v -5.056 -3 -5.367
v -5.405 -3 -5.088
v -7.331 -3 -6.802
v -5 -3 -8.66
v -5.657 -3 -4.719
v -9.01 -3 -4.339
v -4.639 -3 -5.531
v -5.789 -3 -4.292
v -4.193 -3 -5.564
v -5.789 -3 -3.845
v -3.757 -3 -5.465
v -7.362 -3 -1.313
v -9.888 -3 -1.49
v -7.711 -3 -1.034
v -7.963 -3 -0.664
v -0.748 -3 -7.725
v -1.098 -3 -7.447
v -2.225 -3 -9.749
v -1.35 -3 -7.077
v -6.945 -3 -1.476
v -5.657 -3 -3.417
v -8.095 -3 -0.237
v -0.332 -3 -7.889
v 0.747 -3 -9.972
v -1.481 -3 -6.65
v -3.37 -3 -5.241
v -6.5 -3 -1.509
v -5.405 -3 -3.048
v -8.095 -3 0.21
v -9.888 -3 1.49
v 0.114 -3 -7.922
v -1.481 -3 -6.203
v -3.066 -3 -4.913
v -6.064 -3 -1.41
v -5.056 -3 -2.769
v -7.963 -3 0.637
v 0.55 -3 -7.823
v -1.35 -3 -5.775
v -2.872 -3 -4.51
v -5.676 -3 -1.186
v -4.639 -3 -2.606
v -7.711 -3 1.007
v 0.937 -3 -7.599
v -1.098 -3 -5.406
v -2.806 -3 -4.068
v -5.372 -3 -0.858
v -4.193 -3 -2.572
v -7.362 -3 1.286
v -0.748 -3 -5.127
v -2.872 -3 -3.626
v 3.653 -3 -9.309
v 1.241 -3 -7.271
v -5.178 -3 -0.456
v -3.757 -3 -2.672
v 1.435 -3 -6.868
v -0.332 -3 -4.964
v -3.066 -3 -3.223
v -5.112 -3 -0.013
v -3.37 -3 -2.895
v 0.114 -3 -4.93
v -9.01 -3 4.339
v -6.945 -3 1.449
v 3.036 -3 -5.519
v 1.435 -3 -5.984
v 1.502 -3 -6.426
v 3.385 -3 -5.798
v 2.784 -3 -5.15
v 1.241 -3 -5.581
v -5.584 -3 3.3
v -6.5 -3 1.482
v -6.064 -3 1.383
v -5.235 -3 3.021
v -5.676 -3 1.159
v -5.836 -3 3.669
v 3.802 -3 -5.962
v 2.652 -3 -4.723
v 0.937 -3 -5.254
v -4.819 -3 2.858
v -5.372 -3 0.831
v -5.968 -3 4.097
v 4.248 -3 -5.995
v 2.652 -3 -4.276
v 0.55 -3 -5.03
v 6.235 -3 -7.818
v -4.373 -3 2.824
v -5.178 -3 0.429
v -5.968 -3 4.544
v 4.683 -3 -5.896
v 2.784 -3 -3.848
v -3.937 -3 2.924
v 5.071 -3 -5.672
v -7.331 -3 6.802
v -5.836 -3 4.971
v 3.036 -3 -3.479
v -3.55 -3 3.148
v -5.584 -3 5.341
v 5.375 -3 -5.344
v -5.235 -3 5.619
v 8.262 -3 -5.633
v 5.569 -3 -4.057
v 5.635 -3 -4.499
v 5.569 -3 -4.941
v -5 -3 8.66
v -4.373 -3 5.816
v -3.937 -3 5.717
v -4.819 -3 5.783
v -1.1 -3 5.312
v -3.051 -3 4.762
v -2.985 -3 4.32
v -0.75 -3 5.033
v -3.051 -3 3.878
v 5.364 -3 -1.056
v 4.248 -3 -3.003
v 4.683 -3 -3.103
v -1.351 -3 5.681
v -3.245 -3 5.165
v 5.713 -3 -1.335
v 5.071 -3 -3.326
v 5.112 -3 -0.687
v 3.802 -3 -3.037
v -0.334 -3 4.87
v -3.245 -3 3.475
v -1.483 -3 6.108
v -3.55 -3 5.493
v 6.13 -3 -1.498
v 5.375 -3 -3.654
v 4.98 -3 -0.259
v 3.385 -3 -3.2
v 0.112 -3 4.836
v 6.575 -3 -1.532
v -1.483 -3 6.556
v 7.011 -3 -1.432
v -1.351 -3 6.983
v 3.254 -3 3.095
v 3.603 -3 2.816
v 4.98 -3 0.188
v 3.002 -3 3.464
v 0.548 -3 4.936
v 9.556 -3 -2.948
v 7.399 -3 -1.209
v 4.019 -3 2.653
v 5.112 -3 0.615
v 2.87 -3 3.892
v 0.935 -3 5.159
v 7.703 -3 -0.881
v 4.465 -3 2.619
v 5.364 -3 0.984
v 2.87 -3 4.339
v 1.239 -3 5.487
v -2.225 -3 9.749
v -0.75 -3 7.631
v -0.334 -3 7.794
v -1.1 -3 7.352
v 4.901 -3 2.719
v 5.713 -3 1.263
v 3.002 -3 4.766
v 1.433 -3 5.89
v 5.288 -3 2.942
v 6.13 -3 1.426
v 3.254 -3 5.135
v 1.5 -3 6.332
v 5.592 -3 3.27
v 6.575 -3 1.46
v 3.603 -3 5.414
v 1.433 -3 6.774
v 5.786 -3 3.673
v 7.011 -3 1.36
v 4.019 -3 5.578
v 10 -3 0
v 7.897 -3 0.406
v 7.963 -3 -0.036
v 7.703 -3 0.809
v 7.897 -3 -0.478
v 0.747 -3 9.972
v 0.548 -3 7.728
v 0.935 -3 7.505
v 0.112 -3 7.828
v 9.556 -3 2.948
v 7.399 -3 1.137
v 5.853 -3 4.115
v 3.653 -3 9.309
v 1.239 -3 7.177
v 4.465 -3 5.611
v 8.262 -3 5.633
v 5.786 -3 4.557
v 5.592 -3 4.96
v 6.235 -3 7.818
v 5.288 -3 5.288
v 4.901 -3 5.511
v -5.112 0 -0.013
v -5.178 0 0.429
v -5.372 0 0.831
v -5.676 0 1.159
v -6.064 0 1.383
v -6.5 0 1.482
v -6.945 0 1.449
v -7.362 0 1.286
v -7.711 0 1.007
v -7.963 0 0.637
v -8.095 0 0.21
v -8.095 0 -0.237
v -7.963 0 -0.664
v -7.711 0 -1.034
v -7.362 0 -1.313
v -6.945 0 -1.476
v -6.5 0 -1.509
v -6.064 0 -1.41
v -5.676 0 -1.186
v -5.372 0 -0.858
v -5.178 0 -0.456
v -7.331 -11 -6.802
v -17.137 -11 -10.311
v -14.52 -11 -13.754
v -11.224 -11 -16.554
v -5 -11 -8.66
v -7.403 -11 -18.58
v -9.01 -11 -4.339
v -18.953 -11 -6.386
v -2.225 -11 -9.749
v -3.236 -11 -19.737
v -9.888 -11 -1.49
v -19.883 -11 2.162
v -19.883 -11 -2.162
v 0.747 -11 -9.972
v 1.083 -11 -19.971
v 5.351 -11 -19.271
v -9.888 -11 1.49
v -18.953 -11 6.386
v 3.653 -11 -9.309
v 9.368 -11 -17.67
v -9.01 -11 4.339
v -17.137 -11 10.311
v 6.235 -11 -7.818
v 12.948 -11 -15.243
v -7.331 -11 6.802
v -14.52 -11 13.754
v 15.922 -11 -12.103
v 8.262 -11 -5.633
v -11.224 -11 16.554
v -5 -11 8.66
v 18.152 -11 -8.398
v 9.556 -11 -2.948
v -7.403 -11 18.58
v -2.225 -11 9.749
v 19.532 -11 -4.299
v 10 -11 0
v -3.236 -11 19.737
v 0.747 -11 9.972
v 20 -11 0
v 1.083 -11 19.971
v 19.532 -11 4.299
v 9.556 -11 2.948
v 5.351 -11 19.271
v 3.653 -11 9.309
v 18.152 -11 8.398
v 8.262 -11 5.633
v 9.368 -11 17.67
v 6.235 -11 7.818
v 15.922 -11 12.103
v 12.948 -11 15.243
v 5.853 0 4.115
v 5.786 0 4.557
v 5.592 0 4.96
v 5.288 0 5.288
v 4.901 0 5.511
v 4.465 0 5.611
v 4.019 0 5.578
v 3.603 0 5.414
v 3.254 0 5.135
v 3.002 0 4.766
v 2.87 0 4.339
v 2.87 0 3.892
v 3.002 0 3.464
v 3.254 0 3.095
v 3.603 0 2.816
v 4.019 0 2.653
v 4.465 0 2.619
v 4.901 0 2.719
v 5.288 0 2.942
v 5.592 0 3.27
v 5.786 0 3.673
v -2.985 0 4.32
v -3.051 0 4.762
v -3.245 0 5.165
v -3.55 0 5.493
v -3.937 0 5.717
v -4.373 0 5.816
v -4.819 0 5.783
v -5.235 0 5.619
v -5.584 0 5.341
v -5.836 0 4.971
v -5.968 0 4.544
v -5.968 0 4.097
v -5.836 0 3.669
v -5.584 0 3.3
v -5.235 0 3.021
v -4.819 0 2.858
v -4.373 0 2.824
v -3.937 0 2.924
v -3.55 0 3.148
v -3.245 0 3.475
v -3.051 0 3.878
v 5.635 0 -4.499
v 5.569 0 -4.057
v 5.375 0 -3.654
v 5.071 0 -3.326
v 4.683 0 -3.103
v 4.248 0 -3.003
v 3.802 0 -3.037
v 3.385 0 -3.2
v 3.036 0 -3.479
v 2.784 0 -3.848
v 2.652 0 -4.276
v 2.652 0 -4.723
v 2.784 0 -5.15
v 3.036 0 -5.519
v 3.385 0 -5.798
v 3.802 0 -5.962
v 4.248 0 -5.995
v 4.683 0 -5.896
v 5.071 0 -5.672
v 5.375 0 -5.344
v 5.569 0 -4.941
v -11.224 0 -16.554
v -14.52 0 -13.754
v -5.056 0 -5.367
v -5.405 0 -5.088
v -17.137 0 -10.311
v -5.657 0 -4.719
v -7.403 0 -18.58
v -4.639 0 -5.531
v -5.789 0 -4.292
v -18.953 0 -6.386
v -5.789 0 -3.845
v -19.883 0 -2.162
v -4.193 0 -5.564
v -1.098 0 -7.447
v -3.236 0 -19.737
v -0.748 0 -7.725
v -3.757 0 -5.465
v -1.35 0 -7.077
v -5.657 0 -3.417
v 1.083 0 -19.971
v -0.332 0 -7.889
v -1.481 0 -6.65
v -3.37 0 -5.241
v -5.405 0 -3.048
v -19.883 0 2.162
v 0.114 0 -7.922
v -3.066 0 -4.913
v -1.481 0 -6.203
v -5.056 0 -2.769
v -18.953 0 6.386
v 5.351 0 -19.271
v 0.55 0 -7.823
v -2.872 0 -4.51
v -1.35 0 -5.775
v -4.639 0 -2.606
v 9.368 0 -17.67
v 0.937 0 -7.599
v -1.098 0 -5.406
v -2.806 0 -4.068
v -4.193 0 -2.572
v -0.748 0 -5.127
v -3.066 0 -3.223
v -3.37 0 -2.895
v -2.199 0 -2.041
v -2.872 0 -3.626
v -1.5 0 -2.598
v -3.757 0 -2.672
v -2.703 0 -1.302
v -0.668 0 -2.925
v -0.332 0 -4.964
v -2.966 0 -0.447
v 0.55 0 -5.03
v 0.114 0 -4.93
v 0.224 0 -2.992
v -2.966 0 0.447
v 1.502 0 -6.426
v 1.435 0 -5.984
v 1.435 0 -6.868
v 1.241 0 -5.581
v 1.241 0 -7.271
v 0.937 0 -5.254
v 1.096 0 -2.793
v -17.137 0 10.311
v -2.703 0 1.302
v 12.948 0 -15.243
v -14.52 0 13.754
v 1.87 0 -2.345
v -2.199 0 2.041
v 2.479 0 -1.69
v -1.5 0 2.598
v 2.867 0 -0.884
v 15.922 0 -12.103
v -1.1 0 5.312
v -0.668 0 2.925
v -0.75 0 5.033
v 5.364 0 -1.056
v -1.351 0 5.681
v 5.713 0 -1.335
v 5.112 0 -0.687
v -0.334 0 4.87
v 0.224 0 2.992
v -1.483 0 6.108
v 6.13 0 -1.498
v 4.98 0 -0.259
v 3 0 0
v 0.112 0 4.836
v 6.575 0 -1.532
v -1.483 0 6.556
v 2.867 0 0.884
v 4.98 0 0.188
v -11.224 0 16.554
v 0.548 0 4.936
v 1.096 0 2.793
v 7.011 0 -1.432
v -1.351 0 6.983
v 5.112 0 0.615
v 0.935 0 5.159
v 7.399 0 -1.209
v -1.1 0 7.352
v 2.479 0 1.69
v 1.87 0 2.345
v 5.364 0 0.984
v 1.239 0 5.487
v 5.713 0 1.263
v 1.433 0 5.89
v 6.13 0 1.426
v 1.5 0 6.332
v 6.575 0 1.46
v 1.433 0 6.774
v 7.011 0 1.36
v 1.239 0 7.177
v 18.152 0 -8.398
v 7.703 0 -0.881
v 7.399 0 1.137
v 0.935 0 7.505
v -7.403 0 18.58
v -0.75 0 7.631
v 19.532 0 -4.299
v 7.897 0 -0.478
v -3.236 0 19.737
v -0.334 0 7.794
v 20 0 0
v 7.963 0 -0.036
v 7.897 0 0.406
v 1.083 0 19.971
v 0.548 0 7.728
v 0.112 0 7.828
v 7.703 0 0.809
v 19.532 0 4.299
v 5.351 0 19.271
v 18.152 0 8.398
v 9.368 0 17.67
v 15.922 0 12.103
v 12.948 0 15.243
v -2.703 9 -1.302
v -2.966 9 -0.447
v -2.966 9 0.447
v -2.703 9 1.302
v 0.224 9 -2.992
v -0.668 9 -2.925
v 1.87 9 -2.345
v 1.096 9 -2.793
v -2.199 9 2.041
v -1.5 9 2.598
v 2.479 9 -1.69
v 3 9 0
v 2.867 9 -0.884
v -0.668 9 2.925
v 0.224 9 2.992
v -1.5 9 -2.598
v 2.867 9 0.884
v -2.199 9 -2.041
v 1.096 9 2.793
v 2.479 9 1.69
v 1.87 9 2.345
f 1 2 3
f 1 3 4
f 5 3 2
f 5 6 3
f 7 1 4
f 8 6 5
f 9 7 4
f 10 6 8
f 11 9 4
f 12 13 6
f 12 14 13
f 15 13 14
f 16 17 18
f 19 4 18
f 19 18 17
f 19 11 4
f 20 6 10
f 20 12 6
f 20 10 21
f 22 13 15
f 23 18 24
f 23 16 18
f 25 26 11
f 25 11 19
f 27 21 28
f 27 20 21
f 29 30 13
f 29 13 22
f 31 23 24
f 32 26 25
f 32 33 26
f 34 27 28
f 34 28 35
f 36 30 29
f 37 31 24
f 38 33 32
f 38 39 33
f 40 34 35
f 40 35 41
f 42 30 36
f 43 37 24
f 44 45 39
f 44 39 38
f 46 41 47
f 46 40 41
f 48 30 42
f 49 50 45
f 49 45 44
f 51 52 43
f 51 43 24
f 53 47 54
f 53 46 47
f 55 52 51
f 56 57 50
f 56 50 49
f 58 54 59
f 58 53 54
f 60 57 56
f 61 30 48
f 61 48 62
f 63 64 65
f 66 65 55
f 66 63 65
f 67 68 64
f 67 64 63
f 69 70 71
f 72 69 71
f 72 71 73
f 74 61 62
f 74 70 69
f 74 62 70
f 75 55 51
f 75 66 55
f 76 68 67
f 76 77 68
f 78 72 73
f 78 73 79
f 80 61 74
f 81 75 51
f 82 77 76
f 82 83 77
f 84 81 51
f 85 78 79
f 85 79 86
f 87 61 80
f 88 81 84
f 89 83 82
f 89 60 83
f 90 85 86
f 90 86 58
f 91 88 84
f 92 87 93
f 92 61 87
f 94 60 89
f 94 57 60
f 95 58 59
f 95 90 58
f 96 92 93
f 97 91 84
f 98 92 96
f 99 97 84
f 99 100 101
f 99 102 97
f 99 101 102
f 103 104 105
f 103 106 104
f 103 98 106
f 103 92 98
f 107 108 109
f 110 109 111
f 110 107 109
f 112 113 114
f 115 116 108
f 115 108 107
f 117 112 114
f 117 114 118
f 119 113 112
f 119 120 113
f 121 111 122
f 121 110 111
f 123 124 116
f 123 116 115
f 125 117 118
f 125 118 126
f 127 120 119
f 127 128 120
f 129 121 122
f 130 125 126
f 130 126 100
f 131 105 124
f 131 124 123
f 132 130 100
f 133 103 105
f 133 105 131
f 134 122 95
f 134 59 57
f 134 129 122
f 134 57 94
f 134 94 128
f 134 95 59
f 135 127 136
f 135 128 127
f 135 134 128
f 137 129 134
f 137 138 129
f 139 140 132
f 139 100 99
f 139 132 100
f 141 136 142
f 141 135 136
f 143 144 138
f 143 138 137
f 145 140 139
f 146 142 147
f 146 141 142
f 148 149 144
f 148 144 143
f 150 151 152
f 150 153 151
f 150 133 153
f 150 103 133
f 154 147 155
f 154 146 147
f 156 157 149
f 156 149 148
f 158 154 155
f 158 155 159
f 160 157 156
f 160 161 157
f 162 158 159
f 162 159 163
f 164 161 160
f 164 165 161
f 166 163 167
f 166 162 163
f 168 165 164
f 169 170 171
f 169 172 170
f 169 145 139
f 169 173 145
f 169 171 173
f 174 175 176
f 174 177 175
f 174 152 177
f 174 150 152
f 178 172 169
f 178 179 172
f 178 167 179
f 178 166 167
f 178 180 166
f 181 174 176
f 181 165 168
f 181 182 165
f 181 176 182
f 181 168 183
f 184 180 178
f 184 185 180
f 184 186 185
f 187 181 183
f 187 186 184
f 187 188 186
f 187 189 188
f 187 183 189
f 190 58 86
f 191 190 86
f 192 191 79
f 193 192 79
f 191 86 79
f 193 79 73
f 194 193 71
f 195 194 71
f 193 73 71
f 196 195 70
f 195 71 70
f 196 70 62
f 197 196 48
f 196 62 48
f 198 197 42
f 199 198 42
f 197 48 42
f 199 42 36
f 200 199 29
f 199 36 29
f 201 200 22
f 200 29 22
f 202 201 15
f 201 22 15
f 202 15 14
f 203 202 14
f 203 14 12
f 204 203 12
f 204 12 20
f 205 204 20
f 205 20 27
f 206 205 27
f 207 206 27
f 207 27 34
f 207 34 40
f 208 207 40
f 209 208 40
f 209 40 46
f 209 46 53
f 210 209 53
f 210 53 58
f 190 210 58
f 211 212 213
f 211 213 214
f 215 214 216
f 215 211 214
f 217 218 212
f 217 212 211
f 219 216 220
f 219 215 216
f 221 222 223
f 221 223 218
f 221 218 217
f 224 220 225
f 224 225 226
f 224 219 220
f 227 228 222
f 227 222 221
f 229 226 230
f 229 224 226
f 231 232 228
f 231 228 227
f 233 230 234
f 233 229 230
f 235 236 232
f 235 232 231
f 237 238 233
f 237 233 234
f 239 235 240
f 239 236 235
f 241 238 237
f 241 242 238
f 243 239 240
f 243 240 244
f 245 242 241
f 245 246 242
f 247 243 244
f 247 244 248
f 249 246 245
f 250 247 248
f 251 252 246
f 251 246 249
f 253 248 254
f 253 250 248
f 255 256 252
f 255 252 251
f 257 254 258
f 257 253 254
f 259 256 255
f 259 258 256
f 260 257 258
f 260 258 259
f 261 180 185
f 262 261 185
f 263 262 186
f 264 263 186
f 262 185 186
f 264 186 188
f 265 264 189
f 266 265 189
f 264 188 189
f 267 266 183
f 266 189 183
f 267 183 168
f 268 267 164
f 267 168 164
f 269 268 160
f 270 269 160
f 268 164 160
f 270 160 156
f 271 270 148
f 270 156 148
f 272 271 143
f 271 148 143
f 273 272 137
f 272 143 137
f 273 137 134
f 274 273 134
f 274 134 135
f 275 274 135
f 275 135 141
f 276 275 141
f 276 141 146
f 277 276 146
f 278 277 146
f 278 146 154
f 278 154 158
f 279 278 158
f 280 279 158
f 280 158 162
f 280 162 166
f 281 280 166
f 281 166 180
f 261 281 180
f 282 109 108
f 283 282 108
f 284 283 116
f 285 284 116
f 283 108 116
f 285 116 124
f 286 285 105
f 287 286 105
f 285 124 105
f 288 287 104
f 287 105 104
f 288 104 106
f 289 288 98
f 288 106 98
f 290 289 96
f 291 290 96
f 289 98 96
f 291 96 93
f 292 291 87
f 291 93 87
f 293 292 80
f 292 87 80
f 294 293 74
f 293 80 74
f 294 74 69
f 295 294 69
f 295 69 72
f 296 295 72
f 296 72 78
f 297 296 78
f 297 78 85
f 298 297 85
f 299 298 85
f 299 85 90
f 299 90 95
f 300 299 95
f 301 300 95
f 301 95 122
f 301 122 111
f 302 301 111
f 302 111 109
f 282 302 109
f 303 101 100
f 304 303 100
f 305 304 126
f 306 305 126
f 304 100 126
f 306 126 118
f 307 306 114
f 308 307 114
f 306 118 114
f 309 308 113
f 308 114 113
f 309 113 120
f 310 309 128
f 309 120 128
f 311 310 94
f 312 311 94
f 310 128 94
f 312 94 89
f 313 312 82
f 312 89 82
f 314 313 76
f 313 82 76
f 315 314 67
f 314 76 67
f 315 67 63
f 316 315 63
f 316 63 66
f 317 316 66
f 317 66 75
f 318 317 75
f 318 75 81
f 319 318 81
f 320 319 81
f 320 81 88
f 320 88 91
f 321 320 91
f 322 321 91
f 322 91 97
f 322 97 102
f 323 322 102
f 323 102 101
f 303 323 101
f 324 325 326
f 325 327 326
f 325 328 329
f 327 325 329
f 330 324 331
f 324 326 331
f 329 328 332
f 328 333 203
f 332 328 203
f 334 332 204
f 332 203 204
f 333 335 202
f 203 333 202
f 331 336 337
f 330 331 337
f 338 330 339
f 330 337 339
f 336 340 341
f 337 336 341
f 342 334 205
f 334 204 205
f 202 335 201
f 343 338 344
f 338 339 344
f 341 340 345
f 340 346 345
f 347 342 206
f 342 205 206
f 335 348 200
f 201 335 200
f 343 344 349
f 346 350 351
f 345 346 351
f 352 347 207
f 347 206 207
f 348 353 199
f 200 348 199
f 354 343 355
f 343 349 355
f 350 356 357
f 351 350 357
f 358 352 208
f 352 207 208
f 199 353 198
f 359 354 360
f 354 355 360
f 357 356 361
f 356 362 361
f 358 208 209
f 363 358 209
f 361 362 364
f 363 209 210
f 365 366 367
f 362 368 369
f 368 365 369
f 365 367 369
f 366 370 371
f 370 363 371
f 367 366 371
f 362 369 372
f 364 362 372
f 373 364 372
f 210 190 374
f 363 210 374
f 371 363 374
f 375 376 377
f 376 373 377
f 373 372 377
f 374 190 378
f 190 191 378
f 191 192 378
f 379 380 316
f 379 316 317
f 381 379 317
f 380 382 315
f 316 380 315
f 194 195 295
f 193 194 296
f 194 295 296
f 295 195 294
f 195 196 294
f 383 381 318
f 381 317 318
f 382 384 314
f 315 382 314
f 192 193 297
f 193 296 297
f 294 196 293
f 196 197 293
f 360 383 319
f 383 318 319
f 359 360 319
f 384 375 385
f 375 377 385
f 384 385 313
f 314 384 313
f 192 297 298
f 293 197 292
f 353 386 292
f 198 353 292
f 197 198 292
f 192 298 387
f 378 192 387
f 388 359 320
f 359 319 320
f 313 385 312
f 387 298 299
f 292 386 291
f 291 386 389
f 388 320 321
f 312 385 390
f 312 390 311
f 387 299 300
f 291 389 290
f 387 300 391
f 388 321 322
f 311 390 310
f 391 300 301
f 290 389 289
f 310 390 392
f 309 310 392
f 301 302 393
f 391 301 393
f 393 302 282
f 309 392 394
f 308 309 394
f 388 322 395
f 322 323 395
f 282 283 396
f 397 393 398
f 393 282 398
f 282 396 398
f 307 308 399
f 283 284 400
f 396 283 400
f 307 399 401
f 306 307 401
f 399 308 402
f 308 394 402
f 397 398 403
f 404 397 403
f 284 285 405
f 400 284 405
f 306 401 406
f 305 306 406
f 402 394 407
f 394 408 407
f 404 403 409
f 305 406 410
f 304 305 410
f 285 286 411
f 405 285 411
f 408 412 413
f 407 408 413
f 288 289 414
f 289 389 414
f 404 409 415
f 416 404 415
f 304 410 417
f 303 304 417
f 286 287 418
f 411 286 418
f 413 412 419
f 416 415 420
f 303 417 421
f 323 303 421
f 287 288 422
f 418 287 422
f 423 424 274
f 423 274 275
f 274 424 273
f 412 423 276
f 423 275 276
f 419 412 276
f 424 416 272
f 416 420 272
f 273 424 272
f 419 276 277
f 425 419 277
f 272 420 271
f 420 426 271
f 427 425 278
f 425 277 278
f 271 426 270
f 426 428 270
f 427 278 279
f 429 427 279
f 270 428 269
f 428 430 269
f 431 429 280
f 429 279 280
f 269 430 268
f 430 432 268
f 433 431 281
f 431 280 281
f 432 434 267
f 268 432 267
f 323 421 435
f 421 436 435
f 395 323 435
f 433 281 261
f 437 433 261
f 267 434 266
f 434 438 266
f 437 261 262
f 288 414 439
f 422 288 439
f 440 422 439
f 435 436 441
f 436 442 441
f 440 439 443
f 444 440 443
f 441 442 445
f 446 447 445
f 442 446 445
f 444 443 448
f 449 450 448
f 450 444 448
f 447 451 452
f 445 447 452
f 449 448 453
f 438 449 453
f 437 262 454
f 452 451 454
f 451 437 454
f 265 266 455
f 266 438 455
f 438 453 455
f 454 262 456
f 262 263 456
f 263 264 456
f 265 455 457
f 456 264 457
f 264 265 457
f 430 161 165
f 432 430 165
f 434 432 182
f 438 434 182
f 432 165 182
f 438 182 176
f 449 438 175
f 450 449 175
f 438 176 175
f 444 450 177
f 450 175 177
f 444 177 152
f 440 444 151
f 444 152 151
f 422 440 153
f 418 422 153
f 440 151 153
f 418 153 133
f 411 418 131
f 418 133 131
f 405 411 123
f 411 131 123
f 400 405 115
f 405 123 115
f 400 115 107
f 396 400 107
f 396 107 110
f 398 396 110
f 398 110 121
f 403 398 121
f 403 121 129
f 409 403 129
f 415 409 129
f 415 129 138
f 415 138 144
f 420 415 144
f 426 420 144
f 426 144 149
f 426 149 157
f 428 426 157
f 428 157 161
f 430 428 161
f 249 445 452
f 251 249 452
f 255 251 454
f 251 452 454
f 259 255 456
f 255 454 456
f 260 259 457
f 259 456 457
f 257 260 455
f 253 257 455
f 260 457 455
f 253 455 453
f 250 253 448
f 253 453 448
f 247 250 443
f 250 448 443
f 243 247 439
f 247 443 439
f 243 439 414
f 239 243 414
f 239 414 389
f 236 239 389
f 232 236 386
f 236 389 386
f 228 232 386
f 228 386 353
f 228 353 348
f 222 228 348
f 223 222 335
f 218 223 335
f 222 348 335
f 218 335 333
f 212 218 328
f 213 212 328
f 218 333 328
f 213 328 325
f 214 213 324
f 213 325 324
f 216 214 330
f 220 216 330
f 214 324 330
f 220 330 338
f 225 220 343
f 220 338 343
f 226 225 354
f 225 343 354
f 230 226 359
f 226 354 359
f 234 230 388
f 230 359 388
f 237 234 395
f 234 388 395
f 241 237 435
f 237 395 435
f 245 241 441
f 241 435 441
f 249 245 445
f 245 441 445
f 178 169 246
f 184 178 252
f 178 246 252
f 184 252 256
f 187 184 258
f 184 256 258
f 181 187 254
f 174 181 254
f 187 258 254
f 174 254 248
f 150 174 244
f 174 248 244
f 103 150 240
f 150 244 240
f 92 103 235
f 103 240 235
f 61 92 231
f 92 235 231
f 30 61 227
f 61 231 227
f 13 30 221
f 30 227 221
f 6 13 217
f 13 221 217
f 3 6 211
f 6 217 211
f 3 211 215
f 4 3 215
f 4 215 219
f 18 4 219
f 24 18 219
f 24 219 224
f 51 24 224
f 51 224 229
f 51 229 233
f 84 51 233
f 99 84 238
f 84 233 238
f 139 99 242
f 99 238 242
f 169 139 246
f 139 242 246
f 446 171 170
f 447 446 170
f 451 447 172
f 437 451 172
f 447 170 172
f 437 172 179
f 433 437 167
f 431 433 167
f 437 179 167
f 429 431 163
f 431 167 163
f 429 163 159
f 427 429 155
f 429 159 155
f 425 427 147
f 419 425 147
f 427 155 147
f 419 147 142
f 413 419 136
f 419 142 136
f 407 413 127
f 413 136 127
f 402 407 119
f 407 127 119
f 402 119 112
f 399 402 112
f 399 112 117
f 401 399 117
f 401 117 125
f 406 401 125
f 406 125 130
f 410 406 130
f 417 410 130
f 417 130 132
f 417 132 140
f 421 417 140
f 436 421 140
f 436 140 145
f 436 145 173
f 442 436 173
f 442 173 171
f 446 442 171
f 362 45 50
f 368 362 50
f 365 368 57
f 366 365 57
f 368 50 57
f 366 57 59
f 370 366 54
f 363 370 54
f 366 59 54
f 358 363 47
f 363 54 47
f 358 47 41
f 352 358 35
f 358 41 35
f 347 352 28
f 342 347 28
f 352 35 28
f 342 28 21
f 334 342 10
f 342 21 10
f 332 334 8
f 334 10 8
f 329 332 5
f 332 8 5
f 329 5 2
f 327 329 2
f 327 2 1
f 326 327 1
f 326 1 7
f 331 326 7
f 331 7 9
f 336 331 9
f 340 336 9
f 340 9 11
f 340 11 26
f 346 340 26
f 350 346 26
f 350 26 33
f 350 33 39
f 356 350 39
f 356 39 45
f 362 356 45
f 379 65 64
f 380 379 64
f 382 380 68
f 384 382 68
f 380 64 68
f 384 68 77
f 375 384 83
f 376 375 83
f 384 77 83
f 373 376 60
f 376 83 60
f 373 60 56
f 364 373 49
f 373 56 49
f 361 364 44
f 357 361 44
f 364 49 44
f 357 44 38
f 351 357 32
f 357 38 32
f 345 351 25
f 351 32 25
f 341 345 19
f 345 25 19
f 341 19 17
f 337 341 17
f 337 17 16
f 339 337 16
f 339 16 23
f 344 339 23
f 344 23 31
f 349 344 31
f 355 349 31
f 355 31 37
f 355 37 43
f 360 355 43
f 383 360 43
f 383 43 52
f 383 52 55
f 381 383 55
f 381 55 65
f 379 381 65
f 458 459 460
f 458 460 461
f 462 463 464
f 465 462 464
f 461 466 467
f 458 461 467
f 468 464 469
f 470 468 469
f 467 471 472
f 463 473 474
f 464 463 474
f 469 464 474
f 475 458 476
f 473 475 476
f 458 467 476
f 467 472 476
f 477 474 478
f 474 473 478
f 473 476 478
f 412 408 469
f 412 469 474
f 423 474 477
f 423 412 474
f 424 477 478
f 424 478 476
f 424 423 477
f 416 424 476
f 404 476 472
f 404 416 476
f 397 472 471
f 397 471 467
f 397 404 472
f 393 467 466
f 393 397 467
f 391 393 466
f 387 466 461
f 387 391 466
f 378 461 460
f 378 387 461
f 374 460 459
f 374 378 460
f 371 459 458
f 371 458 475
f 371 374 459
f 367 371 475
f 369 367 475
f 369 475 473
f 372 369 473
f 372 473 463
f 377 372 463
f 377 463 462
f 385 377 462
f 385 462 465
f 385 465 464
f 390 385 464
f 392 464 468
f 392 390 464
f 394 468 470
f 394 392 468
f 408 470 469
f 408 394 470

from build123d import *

# Parameters (mm, degrees)
F0_R     = 3
F1_DEPTH = 9
F2_R     = 3
F3_DEPTH = 9.5
F2_R_2   = 20
F4_DEPTH = 11
F5_R     = 10
F6_DEPTH = 8
F7_R     = 1.5
F8_DEPTH = 8


with BuildPart() as f1:
    # F0 (on Front) → F1 (new body)
    with BuildSketch(Plane.XZ):
        Circle(F0_R)
    extrude(amount=-F1_DEPTH)

    # F2 (on face) → F3 (join)
    with BuildSketch(Plane.XZ):
        Circle(F2_R)
    extrude(amount=F3_DEPTH)

    # F2 (on face) → F4 (join)
    with BuildSketch(Plane.XZ):
        Circle(F2_R_2)
    extrude(amount=F4_DEPTH)

    # F5 (on face) → F6 (cut)
    with BuildSketch(Plane.XZ.offset(11)):
        Circle(F5_R)
    extrude(amount=-F6_DEPTH, mode=Mode.SUBTRACT)

    # F7 (on face) → F8 (cut)
    with BuildSketch(Plane.XZ.offset(3)):
        with Locations((6.463317, -0.03593)):
            Circle(F7_R)
        with Locations((4.35309, 4.115115)):
            Circle(F7_R)
        with Locations((0, 6.331937)):
            Circle(F7_R)
        with Locations((-4.484795, 4.320276)):
            Circle(F7_R)
        with Locations((-6.611656, -0.013489)):
            Circle(F7_R)
        with Locations((-4.305509, -4.068238)):
            Circle(F7_R)
        with Locations((0.001843, -6.426248)):
            Circle(F7_R)
        with Locations((4.135434, -4.499229)):
            Circle(F7_R)
    extrude(amount=-F8_DEPTH, mode=Mode.SUBTRACT)


solid = f1.part
